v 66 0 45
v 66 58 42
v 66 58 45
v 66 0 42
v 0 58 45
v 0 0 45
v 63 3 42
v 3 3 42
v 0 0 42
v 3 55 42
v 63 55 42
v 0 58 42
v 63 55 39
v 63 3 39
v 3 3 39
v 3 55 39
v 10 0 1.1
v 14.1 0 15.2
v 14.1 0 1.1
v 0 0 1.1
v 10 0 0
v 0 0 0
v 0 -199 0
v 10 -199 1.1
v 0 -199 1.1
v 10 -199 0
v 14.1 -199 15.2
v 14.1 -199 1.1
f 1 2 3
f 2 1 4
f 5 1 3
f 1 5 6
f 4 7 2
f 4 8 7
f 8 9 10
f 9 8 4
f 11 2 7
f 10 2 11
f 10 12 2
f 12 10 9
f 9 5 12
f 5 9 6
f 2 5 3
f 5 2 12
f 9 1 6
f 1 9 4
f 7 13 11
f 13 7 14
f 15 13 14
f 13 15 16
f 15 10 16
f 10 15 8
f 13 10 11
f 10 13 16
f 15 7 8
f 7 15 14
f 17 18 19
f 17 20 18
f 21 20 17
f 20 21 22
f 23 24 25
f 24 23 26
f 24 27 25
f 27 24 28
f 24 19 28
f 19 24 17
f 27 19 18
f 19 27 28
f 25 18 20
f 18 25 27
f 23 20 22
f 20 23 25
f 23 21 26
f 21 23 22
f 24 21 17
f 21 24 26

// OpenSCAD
// file: prism.scad
platform_height = 1.1;
platform_width = 10;
triangle_height = 14.1;
triangle_width = 14.1;
triangle_length = 199;

points = [[0,0],[0,platform_height],[triangle_width,platform_height+triangle_height],[triangle_width,platform_height],[platform_width,platform_height],[platform_width,0]];

rotate([90,0,0]) {
    linear_extrude(triangle_length)
        polygon(points);
}
// main file
include <prism.scad>

rail_width = 50;
rail_height = 20;
rail_length = 120;
rail_tolerance = 0.5;
wall_thickness = 3;
box_width = 58;
box_length = 66;
box_height = 42;
button_hole_diameter = 22;
screw_hole_diameter = 4;
screw_hole_offset = 12;
cable_hole_diameter = 4;
cable_hole_offset = 4;
lid_tolerance = 0.2;
box_bracket_overlap = 25;
bracket_rail_overlap = 25;
large_screw_hole_depth = 12;
large_screw_head_diameter = 8;
large_screw_shaft_diameter = 4;
large_screw_hole_offset = 16;

module bracket(){
    difference(){
        cube([
            box_length + bracket_rail_overlap,
            box_width,
            rail_height + wall_thickness
        ]);
        translate([box_length + bracket_rail_overlap, 0, 0]){
           rotate([0, 0, 90]){
                prism(
                    box_length + bracket_rail_overlap,
                    box_width - box_bracket_overlap - wall_thickness,
                    rail_height
                );
            }
        }
        translate([
            large_screw_hole_offset,
            0,
            (rail_height + wall_thickness) / 2]
        ){
            large_screw_hole();
        }
        translate([
            box_length + bracket_rail_overlap - large_screw_hole_offset,
            0,
            (rail_height + wall_thickness) / 2]
        ){
            large_screw_hole();
        }
        translate([
            box_length + bracket_rail_overlap - bracket_rail_overlap / 2,
            box_width - box_bracket_overlap,
            rail_height]
        ){
            small_screw_hole();
        }
    }    
}

module small_screw_hole(){
    rotate([0, 0, 0]){
            cylinder(d=screw_hole_diameter, h=wall_thickness, center=false, $fn=60);
    }
}

module large_screw_hole() {
    rotate([270, 0 ,0]){
        union() {    
            cylinder(d=large_screw_shaft_diameter, h=box_width, center=false, $fn=60);
            cylinder(d=large_screw_head_diameter, h=box_bracket_overlap - wall_thickness, center=false, $fn=180);
        }
    }
}

module box_outer(){
    cube([
        box_length,
        box_width,
        box_height
    ]);
}

module box_inner_cutout(){
    translate([wall_thickness, wall_thickness, wall_thickness]){
        cube([
            box_length - wall_thickness * 2,
            box_width - wall_thickness * 2,
            box_height - wall_thickness * 2
        ]);
    }
}

module button_hole_cutout(){
    translate([0, box_width / 2, box_height / 2]){
        rotate([0, 90, 0]){
            cylinder(d=button_hole_diameter, h=wall_thickness, center=false, $fn=180);
        }
    }
}

module cable_hole_cutout(){
    translate([box_length - wall_thickness - cable_hole_offset - cable_hole_diameter * 2, 0, wall_thickness + cable_hole_offset + cable_hole_diameter / 2]){
        hull(){
            translate([0, wall_thickness, 0]){
                rotate([90, 0, 0]){
                    cylinder(d=cable_hole_diameter, h=wall_thickness + rail_tolerance, center=false, $fn=60);
                }
            }
            translate([cable_hole_diameter, wall_thickness, 0]){
                rotate([90, 0, 0]){
                    cylinder(d=cable_hole_diameter, h=wall_thickness + rail_tolerance, center=false, $fn=60);
                }
            }
        }
    }
}

module lid(){
    color("green"){
        translate([0, 0, box_height - wall_thickness]){
            union(){
                translate([0, 0, wall_thickness]){
                    cube([
                        box_length,
                        box_width,
                        wall_thickness
                    ]);
                }
                translate([wall_thickness, wall_thickness, 0]){
                    cube([
                        box_length - wall_thickness * 2,
                        box_width - wall_thickness * 2,
                        wall_thickness
                    ]);
                }
            }
        }
    }
}

module rail(){
    color("white"){
        cube([
            rail_length,
            rail_width,
            rail_height,
        ]);
    }
}

module box(){
    difference(){
        box_outer();
        box_inner_cutout();
        button_hole_cutout();
        lid();
        cable_hole_cutout();
    }
}

module main() {
    difference() {
        union(){
            translate([0, -box_width + box_bracket_overlap, rail_height]){
                box();            
            }
            translate([0, -box_width + box_bracket_overlap, 0]){
                bracket();
            }
        }
        rail();
    }
}

module assembly() {
    translate([10, 0, 0]){
        main();
        translate([0, -box_width + box_bracket_overlap, rail_height]){        
            lid();
        }
    }
}        

//bracket();
//main();
lid();
//assembly();
//rail();
